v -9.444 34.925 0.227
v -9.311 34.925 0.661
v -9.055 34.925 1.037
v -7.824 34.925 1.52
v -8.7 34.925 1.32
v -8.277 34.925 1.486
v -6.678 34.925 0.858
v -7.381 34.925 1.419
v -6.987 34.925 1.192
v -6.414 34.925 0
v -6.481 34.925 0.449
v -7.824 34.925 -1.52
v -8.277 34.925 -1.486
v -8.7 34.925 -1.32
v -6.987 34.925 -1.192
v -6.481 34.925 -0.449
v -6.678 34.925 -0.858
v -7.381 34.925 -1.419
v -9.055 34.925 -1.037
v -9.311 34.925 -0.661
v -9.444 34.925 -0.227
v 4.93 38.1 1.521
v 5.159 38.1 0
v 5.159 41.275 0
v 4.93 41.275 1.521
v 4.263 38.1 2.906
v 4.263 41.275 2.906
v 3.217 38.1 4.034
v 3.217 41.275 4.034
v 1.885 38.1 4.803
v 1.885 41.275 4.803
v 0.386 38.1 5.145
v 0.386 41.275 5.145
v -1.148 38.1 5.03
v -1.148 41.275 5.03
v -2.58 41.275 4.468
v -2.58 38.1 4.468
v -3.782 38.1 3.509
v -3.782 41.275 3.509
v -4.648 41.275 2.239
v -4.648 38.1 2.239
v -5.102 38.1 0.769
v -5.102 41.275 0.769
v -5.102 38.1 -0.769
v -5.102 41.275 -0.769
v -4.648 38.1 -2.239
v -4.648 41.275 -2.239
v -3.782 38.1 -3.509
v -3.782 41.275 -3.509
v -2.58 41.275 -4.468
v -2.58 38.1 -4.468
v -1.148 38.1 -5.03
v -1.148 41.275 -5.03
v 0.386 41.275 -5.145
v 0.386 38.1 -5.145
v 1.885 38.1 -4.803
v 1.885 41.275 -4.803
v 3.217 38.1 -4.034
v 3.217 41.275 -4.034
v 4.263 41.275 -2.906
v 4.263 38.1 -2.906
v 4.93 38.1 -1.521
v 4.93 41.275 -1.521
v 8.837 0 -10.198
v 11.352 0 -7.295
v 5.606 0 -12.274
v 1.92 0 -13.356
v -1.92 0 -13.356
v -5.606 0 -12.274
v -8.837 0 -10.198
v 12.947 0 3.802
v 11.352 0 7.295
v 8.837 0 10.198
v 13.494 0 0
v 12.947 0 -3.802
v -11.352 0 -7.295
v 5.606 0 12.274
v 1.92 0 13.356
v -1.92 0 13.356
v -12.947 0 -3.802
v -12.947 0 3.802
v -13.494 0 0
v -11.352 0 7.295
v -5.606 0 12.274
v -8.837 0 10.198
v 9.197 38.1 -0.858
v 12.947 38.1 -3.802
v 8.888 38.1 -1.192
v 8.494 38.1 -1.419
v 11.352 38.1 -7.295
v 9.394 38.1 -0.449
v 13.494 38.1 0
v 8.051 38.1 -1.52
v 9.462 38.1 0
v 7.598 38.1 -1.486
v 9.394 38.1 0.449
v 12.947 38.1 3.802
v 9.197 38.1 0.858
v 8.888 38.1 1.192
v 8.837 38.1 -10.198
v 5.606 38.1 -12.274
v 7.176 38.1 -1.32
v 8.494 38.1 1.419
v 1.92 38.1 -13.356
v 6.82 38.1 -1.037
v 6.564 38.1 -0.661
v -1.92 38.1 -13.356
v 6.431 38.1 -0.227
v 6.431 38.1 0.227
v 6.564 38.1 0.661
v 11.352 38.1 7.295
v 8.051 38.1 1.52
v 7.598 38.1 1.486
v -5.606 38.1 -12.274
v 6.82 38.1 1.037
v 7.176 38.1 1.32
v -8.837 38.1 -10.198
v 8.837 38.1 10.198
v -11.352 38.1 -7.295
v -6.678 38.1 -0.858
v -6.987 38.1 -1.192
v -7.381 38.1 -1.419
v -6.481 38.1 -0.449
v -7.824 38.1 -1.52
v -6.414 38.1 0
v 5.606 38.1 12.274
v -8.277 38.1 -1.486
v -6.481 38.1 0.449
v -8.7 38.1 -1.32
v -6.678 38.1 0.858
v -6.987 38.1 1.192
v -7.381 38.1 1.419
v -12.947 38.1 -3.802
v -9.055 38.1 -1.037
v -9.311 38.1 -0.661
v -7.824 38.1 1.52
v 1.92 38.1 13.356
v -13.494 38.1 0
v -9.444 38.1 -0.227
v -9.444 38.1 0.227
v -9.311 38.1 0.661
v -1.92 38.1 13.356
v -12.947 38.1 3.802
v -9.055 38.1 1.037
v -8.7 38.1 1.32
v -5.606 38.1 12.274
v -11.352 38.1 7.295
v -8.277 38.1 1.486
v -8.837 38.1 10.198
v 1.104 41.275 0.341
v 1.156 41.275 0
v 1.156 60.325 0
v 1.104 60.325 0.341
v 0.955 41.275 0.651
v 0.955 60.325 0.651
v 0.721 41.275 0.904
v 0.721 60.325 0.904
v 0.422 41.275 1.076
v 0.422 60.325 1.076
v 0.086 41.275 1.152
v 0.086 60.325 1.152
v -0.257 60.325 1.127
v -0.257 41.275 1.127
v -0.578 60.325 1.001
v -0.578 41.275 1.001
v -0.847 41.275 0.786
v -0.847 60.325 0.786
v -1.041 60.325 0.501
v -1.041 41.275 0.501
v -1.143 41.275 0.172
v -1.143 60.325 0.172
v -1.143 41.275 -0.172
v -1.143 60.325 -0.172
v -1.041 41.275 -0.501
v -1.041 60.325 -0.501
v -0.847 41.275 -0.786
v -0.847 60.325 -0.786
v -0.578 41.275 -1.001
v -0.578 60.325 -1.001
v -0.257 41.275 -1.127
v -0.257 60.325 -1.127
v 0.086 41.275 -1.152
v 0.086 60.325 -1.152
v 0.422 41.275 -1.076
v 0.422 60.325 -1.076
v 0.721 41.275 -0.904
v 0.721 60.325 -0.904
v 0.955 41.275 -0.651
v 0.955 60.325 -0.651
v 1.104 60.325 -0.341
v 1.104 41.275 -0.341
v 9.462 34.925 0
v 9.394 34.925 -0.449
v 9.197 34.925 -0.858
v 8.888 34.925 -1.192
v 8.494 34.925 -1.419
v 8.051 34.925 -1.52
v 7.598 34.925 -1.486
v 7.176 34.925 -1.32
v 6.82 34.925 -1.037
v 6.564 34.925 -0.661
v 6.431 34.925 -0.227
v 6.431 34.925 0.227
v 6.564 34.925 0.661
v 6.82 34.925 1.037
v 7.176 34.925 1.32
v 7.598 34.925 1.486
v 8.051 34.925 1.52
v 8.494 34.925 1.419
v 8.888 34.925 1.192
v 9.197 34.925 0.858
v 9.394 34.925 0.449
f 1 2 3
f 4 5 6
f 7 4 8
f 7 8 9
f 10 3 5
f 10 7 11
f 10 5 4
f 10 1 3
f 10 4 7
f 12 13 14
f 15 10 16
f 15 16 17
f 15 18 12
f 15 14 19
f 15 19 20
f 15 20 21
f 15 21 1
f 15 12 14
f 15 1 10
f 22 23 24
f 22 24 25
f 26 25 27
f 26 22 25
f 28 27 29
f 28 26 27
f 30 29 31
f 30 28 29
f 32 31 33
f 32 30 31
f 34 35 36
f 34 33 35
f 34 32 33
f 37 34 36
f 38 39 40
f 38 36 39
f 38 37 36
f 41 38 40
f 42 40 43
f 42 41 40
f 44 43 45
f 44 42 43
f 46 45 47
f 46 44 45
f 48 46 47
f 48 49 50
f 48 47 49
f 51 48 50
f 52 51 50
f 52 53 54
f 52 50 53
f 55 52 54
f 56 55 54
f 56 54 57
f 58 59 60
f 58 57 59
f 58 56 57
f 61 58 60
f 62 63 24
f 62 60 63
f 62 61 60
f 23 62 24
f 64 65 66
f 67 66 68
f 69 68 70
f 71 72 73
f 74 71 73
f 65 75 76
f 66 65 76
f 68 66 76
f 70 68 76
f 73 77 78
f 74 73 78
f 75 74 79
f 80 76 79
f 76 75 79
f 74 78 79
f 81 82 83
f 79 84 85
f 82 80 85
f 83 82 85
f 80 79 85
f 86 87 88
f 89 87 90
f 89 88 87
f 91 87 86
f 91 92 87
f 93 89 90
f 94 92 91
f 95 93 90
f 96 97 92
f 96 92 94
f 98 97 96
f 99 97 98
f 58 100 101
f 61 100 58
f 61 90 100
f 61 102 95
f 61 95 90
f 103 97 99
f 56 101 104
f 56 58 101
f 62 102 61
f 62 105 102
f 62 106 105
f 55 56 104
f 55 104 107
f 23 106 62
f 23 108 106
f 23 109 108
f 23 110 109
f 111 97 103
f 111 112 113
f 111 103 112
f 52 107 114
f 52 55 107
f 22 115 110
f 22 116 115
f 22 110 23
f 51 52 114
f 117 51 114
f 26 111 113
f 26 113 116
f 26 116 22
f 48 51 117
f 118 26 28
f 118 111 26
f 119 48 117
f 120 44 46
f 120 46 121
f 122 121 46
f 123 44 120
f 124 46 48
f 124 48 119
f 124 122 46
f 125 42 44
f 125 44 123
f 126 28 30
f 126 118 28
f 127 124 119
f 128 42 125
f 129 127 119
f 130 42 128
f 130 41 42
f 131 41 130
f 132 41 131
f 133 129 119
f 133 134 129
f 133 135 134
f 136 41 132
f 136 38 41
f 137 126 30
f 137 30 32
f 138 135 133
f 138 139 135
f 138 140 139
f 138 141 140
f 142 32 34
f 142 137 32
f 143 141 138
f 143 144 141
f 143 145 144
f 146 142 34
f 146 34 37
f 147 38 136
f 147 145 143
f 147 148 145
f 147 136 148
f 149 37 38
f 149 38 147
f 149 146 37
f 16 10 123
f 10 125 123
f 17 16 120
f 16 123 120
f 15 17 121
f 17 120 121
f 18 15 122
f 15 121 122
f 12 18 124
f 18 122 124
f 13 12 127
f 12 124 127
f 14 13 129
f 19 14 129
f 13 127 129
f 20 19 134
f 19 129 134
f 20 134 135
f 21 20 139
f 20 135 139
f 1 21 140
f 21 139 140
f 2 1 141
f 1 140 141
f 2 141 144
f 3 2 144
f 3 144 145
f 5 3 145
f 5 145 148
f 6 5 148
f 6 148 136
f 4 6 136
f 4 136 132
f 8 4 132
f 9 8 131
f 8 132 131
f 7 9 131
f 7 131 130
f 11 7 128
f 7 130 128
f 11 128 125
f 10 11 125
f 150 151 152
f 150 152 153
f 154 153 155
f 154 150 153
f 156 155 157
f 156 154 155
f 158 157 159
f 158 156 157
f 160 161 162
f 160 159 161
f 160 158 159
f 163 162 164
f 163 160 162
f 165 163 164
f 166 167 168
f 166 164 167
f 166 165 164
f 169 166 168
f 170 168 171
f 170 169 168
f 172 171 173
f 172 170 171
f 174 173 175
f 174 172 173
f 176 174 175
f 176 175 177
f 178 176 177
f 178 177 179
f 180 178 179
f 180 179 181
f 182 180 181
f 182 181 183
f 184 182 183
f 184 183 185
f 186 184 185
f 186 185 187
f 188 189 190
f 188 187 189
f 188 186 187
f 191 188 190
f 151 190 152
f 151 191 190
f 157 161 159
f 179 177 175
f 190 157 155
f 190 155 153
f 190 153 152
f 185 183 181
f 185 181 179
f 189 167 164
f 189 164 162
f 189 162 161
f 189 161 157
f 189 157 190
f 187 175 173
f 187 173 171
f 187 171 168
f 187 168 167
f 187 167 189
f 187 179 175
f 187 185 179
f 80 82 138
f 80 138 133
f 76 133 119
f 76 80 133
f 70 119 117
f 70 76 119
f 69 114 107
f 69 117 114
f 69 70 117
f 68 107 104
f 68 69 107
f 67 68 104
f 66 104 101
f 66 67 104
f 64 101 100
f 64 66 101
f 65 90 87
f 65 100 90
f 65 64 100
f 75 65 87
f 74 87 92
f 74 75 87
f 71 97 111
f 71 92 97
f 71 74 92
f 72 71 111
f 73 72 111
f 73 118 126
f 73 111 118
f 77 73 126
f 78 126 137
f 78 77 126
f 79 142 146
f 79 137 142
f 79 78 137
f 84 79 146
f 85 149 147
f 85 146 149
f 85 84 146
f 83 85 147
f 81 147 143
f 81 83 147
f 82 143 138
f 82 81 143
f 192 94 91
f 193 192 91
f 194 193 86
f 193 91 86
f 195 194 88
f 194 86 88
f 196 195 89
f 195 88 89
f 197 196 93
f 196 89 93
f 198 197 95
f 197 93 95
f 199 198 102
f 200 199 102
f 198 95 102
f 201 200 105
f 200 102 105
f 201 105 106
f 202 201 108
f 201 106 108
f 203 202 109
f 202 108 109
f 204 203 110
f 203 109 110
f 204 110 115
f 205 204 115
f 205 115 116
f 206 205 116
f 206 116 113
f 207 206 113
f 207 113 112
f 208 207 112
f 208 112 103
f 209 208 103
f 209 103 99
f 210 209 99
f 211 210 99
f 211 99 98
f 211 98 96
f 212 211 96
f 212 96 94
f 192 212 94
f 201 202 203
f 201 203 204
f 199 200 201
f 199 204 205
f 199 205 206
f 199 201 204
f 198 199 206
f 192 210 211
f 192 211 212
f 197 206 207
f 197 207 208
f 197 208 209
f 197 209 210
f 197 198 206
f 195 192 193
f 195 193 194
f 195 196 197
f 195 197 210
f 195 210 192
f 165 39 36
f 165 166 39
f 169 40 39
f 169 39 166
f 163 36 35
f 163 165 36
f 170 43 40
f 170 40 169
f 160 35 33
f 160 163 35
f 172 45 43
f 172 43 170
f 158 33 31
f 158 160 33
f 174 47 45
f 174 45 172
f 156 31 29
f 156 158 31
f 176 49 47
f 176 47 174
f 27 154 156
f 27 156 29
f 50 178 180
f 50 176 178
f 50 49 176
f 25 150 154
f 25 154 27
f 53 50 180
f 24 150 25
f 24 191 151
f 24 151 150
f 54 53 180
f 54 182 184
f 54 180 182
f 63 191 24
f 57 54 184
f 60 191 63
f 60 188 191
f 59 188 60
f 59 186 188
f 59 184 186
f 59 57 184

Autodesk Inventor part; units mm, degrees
ref_plane "YZ Plane" through (0, 0, 0) normal (1, 0, 0) x (0, 1, 0)
ref_plane "XZ Plane" through (0, 0, 0) normal (0, 1, 0) x (-1, 0, 0)
ref_plane "XY Plane" through (0, 0, 0) normal (0, 0, 1) x (1, 0, 0)
sketch "Sketch1" plane through (0, 0, 0) normal (0, 1, 0) x (-1, 0, 0)
  circle A0 centre (0, 0) radius 13.4938
  dimension "d0" = 26.9875
extrude "Extrusion1" add sketch "Sketch1" along normal blind 38.1
sketch "Sketch2" plane through (0, 38.1, 0) normal (0, 1, 0) x (1, 0, 0)
  circle A0 centre (0, 0) radius 5.1594
  dimension "d3" = 10.3187
extrude "Extrusion2" add sketch "Sketch2" along normal blind 3.175
sketch "Sketch3" plane through (0, 38.1, 0) normal (0, 1, 0) x (1, 0, 0)
  circle A0 centre (-7.9375, 0) radius 1.524
  line L0 (0, 0) -> (-7.9375, 0) construction
  line L1 (0, -15.84) -> (0, 17.6643) construction
  circle A1 centre (7.9375, 0) radius 1.524
  line L2 (0, 0) -> (7.9375, 0) construction
  dimension "d6" = 3.048
  dimension "d7" = 7.9375
  dimension "d8" = 0
  dimension "d9" = 17.6643
  dimension "d10" = 15.8399
extrude "Extrusion3" cut sketch "Sketch3" against normal blind 3.175
sketch "Sketch6" plane through (0, 41.275, 0) normal (0, 1, 0) x (1, 0, 0)
  circle A0 centre (0, 0) radius 1.1557
  dimension "d18" = 2.3114
extrude "Extrusion6" add sketch "Sketch6" along normal blind 19.05
properties part number "motor"
